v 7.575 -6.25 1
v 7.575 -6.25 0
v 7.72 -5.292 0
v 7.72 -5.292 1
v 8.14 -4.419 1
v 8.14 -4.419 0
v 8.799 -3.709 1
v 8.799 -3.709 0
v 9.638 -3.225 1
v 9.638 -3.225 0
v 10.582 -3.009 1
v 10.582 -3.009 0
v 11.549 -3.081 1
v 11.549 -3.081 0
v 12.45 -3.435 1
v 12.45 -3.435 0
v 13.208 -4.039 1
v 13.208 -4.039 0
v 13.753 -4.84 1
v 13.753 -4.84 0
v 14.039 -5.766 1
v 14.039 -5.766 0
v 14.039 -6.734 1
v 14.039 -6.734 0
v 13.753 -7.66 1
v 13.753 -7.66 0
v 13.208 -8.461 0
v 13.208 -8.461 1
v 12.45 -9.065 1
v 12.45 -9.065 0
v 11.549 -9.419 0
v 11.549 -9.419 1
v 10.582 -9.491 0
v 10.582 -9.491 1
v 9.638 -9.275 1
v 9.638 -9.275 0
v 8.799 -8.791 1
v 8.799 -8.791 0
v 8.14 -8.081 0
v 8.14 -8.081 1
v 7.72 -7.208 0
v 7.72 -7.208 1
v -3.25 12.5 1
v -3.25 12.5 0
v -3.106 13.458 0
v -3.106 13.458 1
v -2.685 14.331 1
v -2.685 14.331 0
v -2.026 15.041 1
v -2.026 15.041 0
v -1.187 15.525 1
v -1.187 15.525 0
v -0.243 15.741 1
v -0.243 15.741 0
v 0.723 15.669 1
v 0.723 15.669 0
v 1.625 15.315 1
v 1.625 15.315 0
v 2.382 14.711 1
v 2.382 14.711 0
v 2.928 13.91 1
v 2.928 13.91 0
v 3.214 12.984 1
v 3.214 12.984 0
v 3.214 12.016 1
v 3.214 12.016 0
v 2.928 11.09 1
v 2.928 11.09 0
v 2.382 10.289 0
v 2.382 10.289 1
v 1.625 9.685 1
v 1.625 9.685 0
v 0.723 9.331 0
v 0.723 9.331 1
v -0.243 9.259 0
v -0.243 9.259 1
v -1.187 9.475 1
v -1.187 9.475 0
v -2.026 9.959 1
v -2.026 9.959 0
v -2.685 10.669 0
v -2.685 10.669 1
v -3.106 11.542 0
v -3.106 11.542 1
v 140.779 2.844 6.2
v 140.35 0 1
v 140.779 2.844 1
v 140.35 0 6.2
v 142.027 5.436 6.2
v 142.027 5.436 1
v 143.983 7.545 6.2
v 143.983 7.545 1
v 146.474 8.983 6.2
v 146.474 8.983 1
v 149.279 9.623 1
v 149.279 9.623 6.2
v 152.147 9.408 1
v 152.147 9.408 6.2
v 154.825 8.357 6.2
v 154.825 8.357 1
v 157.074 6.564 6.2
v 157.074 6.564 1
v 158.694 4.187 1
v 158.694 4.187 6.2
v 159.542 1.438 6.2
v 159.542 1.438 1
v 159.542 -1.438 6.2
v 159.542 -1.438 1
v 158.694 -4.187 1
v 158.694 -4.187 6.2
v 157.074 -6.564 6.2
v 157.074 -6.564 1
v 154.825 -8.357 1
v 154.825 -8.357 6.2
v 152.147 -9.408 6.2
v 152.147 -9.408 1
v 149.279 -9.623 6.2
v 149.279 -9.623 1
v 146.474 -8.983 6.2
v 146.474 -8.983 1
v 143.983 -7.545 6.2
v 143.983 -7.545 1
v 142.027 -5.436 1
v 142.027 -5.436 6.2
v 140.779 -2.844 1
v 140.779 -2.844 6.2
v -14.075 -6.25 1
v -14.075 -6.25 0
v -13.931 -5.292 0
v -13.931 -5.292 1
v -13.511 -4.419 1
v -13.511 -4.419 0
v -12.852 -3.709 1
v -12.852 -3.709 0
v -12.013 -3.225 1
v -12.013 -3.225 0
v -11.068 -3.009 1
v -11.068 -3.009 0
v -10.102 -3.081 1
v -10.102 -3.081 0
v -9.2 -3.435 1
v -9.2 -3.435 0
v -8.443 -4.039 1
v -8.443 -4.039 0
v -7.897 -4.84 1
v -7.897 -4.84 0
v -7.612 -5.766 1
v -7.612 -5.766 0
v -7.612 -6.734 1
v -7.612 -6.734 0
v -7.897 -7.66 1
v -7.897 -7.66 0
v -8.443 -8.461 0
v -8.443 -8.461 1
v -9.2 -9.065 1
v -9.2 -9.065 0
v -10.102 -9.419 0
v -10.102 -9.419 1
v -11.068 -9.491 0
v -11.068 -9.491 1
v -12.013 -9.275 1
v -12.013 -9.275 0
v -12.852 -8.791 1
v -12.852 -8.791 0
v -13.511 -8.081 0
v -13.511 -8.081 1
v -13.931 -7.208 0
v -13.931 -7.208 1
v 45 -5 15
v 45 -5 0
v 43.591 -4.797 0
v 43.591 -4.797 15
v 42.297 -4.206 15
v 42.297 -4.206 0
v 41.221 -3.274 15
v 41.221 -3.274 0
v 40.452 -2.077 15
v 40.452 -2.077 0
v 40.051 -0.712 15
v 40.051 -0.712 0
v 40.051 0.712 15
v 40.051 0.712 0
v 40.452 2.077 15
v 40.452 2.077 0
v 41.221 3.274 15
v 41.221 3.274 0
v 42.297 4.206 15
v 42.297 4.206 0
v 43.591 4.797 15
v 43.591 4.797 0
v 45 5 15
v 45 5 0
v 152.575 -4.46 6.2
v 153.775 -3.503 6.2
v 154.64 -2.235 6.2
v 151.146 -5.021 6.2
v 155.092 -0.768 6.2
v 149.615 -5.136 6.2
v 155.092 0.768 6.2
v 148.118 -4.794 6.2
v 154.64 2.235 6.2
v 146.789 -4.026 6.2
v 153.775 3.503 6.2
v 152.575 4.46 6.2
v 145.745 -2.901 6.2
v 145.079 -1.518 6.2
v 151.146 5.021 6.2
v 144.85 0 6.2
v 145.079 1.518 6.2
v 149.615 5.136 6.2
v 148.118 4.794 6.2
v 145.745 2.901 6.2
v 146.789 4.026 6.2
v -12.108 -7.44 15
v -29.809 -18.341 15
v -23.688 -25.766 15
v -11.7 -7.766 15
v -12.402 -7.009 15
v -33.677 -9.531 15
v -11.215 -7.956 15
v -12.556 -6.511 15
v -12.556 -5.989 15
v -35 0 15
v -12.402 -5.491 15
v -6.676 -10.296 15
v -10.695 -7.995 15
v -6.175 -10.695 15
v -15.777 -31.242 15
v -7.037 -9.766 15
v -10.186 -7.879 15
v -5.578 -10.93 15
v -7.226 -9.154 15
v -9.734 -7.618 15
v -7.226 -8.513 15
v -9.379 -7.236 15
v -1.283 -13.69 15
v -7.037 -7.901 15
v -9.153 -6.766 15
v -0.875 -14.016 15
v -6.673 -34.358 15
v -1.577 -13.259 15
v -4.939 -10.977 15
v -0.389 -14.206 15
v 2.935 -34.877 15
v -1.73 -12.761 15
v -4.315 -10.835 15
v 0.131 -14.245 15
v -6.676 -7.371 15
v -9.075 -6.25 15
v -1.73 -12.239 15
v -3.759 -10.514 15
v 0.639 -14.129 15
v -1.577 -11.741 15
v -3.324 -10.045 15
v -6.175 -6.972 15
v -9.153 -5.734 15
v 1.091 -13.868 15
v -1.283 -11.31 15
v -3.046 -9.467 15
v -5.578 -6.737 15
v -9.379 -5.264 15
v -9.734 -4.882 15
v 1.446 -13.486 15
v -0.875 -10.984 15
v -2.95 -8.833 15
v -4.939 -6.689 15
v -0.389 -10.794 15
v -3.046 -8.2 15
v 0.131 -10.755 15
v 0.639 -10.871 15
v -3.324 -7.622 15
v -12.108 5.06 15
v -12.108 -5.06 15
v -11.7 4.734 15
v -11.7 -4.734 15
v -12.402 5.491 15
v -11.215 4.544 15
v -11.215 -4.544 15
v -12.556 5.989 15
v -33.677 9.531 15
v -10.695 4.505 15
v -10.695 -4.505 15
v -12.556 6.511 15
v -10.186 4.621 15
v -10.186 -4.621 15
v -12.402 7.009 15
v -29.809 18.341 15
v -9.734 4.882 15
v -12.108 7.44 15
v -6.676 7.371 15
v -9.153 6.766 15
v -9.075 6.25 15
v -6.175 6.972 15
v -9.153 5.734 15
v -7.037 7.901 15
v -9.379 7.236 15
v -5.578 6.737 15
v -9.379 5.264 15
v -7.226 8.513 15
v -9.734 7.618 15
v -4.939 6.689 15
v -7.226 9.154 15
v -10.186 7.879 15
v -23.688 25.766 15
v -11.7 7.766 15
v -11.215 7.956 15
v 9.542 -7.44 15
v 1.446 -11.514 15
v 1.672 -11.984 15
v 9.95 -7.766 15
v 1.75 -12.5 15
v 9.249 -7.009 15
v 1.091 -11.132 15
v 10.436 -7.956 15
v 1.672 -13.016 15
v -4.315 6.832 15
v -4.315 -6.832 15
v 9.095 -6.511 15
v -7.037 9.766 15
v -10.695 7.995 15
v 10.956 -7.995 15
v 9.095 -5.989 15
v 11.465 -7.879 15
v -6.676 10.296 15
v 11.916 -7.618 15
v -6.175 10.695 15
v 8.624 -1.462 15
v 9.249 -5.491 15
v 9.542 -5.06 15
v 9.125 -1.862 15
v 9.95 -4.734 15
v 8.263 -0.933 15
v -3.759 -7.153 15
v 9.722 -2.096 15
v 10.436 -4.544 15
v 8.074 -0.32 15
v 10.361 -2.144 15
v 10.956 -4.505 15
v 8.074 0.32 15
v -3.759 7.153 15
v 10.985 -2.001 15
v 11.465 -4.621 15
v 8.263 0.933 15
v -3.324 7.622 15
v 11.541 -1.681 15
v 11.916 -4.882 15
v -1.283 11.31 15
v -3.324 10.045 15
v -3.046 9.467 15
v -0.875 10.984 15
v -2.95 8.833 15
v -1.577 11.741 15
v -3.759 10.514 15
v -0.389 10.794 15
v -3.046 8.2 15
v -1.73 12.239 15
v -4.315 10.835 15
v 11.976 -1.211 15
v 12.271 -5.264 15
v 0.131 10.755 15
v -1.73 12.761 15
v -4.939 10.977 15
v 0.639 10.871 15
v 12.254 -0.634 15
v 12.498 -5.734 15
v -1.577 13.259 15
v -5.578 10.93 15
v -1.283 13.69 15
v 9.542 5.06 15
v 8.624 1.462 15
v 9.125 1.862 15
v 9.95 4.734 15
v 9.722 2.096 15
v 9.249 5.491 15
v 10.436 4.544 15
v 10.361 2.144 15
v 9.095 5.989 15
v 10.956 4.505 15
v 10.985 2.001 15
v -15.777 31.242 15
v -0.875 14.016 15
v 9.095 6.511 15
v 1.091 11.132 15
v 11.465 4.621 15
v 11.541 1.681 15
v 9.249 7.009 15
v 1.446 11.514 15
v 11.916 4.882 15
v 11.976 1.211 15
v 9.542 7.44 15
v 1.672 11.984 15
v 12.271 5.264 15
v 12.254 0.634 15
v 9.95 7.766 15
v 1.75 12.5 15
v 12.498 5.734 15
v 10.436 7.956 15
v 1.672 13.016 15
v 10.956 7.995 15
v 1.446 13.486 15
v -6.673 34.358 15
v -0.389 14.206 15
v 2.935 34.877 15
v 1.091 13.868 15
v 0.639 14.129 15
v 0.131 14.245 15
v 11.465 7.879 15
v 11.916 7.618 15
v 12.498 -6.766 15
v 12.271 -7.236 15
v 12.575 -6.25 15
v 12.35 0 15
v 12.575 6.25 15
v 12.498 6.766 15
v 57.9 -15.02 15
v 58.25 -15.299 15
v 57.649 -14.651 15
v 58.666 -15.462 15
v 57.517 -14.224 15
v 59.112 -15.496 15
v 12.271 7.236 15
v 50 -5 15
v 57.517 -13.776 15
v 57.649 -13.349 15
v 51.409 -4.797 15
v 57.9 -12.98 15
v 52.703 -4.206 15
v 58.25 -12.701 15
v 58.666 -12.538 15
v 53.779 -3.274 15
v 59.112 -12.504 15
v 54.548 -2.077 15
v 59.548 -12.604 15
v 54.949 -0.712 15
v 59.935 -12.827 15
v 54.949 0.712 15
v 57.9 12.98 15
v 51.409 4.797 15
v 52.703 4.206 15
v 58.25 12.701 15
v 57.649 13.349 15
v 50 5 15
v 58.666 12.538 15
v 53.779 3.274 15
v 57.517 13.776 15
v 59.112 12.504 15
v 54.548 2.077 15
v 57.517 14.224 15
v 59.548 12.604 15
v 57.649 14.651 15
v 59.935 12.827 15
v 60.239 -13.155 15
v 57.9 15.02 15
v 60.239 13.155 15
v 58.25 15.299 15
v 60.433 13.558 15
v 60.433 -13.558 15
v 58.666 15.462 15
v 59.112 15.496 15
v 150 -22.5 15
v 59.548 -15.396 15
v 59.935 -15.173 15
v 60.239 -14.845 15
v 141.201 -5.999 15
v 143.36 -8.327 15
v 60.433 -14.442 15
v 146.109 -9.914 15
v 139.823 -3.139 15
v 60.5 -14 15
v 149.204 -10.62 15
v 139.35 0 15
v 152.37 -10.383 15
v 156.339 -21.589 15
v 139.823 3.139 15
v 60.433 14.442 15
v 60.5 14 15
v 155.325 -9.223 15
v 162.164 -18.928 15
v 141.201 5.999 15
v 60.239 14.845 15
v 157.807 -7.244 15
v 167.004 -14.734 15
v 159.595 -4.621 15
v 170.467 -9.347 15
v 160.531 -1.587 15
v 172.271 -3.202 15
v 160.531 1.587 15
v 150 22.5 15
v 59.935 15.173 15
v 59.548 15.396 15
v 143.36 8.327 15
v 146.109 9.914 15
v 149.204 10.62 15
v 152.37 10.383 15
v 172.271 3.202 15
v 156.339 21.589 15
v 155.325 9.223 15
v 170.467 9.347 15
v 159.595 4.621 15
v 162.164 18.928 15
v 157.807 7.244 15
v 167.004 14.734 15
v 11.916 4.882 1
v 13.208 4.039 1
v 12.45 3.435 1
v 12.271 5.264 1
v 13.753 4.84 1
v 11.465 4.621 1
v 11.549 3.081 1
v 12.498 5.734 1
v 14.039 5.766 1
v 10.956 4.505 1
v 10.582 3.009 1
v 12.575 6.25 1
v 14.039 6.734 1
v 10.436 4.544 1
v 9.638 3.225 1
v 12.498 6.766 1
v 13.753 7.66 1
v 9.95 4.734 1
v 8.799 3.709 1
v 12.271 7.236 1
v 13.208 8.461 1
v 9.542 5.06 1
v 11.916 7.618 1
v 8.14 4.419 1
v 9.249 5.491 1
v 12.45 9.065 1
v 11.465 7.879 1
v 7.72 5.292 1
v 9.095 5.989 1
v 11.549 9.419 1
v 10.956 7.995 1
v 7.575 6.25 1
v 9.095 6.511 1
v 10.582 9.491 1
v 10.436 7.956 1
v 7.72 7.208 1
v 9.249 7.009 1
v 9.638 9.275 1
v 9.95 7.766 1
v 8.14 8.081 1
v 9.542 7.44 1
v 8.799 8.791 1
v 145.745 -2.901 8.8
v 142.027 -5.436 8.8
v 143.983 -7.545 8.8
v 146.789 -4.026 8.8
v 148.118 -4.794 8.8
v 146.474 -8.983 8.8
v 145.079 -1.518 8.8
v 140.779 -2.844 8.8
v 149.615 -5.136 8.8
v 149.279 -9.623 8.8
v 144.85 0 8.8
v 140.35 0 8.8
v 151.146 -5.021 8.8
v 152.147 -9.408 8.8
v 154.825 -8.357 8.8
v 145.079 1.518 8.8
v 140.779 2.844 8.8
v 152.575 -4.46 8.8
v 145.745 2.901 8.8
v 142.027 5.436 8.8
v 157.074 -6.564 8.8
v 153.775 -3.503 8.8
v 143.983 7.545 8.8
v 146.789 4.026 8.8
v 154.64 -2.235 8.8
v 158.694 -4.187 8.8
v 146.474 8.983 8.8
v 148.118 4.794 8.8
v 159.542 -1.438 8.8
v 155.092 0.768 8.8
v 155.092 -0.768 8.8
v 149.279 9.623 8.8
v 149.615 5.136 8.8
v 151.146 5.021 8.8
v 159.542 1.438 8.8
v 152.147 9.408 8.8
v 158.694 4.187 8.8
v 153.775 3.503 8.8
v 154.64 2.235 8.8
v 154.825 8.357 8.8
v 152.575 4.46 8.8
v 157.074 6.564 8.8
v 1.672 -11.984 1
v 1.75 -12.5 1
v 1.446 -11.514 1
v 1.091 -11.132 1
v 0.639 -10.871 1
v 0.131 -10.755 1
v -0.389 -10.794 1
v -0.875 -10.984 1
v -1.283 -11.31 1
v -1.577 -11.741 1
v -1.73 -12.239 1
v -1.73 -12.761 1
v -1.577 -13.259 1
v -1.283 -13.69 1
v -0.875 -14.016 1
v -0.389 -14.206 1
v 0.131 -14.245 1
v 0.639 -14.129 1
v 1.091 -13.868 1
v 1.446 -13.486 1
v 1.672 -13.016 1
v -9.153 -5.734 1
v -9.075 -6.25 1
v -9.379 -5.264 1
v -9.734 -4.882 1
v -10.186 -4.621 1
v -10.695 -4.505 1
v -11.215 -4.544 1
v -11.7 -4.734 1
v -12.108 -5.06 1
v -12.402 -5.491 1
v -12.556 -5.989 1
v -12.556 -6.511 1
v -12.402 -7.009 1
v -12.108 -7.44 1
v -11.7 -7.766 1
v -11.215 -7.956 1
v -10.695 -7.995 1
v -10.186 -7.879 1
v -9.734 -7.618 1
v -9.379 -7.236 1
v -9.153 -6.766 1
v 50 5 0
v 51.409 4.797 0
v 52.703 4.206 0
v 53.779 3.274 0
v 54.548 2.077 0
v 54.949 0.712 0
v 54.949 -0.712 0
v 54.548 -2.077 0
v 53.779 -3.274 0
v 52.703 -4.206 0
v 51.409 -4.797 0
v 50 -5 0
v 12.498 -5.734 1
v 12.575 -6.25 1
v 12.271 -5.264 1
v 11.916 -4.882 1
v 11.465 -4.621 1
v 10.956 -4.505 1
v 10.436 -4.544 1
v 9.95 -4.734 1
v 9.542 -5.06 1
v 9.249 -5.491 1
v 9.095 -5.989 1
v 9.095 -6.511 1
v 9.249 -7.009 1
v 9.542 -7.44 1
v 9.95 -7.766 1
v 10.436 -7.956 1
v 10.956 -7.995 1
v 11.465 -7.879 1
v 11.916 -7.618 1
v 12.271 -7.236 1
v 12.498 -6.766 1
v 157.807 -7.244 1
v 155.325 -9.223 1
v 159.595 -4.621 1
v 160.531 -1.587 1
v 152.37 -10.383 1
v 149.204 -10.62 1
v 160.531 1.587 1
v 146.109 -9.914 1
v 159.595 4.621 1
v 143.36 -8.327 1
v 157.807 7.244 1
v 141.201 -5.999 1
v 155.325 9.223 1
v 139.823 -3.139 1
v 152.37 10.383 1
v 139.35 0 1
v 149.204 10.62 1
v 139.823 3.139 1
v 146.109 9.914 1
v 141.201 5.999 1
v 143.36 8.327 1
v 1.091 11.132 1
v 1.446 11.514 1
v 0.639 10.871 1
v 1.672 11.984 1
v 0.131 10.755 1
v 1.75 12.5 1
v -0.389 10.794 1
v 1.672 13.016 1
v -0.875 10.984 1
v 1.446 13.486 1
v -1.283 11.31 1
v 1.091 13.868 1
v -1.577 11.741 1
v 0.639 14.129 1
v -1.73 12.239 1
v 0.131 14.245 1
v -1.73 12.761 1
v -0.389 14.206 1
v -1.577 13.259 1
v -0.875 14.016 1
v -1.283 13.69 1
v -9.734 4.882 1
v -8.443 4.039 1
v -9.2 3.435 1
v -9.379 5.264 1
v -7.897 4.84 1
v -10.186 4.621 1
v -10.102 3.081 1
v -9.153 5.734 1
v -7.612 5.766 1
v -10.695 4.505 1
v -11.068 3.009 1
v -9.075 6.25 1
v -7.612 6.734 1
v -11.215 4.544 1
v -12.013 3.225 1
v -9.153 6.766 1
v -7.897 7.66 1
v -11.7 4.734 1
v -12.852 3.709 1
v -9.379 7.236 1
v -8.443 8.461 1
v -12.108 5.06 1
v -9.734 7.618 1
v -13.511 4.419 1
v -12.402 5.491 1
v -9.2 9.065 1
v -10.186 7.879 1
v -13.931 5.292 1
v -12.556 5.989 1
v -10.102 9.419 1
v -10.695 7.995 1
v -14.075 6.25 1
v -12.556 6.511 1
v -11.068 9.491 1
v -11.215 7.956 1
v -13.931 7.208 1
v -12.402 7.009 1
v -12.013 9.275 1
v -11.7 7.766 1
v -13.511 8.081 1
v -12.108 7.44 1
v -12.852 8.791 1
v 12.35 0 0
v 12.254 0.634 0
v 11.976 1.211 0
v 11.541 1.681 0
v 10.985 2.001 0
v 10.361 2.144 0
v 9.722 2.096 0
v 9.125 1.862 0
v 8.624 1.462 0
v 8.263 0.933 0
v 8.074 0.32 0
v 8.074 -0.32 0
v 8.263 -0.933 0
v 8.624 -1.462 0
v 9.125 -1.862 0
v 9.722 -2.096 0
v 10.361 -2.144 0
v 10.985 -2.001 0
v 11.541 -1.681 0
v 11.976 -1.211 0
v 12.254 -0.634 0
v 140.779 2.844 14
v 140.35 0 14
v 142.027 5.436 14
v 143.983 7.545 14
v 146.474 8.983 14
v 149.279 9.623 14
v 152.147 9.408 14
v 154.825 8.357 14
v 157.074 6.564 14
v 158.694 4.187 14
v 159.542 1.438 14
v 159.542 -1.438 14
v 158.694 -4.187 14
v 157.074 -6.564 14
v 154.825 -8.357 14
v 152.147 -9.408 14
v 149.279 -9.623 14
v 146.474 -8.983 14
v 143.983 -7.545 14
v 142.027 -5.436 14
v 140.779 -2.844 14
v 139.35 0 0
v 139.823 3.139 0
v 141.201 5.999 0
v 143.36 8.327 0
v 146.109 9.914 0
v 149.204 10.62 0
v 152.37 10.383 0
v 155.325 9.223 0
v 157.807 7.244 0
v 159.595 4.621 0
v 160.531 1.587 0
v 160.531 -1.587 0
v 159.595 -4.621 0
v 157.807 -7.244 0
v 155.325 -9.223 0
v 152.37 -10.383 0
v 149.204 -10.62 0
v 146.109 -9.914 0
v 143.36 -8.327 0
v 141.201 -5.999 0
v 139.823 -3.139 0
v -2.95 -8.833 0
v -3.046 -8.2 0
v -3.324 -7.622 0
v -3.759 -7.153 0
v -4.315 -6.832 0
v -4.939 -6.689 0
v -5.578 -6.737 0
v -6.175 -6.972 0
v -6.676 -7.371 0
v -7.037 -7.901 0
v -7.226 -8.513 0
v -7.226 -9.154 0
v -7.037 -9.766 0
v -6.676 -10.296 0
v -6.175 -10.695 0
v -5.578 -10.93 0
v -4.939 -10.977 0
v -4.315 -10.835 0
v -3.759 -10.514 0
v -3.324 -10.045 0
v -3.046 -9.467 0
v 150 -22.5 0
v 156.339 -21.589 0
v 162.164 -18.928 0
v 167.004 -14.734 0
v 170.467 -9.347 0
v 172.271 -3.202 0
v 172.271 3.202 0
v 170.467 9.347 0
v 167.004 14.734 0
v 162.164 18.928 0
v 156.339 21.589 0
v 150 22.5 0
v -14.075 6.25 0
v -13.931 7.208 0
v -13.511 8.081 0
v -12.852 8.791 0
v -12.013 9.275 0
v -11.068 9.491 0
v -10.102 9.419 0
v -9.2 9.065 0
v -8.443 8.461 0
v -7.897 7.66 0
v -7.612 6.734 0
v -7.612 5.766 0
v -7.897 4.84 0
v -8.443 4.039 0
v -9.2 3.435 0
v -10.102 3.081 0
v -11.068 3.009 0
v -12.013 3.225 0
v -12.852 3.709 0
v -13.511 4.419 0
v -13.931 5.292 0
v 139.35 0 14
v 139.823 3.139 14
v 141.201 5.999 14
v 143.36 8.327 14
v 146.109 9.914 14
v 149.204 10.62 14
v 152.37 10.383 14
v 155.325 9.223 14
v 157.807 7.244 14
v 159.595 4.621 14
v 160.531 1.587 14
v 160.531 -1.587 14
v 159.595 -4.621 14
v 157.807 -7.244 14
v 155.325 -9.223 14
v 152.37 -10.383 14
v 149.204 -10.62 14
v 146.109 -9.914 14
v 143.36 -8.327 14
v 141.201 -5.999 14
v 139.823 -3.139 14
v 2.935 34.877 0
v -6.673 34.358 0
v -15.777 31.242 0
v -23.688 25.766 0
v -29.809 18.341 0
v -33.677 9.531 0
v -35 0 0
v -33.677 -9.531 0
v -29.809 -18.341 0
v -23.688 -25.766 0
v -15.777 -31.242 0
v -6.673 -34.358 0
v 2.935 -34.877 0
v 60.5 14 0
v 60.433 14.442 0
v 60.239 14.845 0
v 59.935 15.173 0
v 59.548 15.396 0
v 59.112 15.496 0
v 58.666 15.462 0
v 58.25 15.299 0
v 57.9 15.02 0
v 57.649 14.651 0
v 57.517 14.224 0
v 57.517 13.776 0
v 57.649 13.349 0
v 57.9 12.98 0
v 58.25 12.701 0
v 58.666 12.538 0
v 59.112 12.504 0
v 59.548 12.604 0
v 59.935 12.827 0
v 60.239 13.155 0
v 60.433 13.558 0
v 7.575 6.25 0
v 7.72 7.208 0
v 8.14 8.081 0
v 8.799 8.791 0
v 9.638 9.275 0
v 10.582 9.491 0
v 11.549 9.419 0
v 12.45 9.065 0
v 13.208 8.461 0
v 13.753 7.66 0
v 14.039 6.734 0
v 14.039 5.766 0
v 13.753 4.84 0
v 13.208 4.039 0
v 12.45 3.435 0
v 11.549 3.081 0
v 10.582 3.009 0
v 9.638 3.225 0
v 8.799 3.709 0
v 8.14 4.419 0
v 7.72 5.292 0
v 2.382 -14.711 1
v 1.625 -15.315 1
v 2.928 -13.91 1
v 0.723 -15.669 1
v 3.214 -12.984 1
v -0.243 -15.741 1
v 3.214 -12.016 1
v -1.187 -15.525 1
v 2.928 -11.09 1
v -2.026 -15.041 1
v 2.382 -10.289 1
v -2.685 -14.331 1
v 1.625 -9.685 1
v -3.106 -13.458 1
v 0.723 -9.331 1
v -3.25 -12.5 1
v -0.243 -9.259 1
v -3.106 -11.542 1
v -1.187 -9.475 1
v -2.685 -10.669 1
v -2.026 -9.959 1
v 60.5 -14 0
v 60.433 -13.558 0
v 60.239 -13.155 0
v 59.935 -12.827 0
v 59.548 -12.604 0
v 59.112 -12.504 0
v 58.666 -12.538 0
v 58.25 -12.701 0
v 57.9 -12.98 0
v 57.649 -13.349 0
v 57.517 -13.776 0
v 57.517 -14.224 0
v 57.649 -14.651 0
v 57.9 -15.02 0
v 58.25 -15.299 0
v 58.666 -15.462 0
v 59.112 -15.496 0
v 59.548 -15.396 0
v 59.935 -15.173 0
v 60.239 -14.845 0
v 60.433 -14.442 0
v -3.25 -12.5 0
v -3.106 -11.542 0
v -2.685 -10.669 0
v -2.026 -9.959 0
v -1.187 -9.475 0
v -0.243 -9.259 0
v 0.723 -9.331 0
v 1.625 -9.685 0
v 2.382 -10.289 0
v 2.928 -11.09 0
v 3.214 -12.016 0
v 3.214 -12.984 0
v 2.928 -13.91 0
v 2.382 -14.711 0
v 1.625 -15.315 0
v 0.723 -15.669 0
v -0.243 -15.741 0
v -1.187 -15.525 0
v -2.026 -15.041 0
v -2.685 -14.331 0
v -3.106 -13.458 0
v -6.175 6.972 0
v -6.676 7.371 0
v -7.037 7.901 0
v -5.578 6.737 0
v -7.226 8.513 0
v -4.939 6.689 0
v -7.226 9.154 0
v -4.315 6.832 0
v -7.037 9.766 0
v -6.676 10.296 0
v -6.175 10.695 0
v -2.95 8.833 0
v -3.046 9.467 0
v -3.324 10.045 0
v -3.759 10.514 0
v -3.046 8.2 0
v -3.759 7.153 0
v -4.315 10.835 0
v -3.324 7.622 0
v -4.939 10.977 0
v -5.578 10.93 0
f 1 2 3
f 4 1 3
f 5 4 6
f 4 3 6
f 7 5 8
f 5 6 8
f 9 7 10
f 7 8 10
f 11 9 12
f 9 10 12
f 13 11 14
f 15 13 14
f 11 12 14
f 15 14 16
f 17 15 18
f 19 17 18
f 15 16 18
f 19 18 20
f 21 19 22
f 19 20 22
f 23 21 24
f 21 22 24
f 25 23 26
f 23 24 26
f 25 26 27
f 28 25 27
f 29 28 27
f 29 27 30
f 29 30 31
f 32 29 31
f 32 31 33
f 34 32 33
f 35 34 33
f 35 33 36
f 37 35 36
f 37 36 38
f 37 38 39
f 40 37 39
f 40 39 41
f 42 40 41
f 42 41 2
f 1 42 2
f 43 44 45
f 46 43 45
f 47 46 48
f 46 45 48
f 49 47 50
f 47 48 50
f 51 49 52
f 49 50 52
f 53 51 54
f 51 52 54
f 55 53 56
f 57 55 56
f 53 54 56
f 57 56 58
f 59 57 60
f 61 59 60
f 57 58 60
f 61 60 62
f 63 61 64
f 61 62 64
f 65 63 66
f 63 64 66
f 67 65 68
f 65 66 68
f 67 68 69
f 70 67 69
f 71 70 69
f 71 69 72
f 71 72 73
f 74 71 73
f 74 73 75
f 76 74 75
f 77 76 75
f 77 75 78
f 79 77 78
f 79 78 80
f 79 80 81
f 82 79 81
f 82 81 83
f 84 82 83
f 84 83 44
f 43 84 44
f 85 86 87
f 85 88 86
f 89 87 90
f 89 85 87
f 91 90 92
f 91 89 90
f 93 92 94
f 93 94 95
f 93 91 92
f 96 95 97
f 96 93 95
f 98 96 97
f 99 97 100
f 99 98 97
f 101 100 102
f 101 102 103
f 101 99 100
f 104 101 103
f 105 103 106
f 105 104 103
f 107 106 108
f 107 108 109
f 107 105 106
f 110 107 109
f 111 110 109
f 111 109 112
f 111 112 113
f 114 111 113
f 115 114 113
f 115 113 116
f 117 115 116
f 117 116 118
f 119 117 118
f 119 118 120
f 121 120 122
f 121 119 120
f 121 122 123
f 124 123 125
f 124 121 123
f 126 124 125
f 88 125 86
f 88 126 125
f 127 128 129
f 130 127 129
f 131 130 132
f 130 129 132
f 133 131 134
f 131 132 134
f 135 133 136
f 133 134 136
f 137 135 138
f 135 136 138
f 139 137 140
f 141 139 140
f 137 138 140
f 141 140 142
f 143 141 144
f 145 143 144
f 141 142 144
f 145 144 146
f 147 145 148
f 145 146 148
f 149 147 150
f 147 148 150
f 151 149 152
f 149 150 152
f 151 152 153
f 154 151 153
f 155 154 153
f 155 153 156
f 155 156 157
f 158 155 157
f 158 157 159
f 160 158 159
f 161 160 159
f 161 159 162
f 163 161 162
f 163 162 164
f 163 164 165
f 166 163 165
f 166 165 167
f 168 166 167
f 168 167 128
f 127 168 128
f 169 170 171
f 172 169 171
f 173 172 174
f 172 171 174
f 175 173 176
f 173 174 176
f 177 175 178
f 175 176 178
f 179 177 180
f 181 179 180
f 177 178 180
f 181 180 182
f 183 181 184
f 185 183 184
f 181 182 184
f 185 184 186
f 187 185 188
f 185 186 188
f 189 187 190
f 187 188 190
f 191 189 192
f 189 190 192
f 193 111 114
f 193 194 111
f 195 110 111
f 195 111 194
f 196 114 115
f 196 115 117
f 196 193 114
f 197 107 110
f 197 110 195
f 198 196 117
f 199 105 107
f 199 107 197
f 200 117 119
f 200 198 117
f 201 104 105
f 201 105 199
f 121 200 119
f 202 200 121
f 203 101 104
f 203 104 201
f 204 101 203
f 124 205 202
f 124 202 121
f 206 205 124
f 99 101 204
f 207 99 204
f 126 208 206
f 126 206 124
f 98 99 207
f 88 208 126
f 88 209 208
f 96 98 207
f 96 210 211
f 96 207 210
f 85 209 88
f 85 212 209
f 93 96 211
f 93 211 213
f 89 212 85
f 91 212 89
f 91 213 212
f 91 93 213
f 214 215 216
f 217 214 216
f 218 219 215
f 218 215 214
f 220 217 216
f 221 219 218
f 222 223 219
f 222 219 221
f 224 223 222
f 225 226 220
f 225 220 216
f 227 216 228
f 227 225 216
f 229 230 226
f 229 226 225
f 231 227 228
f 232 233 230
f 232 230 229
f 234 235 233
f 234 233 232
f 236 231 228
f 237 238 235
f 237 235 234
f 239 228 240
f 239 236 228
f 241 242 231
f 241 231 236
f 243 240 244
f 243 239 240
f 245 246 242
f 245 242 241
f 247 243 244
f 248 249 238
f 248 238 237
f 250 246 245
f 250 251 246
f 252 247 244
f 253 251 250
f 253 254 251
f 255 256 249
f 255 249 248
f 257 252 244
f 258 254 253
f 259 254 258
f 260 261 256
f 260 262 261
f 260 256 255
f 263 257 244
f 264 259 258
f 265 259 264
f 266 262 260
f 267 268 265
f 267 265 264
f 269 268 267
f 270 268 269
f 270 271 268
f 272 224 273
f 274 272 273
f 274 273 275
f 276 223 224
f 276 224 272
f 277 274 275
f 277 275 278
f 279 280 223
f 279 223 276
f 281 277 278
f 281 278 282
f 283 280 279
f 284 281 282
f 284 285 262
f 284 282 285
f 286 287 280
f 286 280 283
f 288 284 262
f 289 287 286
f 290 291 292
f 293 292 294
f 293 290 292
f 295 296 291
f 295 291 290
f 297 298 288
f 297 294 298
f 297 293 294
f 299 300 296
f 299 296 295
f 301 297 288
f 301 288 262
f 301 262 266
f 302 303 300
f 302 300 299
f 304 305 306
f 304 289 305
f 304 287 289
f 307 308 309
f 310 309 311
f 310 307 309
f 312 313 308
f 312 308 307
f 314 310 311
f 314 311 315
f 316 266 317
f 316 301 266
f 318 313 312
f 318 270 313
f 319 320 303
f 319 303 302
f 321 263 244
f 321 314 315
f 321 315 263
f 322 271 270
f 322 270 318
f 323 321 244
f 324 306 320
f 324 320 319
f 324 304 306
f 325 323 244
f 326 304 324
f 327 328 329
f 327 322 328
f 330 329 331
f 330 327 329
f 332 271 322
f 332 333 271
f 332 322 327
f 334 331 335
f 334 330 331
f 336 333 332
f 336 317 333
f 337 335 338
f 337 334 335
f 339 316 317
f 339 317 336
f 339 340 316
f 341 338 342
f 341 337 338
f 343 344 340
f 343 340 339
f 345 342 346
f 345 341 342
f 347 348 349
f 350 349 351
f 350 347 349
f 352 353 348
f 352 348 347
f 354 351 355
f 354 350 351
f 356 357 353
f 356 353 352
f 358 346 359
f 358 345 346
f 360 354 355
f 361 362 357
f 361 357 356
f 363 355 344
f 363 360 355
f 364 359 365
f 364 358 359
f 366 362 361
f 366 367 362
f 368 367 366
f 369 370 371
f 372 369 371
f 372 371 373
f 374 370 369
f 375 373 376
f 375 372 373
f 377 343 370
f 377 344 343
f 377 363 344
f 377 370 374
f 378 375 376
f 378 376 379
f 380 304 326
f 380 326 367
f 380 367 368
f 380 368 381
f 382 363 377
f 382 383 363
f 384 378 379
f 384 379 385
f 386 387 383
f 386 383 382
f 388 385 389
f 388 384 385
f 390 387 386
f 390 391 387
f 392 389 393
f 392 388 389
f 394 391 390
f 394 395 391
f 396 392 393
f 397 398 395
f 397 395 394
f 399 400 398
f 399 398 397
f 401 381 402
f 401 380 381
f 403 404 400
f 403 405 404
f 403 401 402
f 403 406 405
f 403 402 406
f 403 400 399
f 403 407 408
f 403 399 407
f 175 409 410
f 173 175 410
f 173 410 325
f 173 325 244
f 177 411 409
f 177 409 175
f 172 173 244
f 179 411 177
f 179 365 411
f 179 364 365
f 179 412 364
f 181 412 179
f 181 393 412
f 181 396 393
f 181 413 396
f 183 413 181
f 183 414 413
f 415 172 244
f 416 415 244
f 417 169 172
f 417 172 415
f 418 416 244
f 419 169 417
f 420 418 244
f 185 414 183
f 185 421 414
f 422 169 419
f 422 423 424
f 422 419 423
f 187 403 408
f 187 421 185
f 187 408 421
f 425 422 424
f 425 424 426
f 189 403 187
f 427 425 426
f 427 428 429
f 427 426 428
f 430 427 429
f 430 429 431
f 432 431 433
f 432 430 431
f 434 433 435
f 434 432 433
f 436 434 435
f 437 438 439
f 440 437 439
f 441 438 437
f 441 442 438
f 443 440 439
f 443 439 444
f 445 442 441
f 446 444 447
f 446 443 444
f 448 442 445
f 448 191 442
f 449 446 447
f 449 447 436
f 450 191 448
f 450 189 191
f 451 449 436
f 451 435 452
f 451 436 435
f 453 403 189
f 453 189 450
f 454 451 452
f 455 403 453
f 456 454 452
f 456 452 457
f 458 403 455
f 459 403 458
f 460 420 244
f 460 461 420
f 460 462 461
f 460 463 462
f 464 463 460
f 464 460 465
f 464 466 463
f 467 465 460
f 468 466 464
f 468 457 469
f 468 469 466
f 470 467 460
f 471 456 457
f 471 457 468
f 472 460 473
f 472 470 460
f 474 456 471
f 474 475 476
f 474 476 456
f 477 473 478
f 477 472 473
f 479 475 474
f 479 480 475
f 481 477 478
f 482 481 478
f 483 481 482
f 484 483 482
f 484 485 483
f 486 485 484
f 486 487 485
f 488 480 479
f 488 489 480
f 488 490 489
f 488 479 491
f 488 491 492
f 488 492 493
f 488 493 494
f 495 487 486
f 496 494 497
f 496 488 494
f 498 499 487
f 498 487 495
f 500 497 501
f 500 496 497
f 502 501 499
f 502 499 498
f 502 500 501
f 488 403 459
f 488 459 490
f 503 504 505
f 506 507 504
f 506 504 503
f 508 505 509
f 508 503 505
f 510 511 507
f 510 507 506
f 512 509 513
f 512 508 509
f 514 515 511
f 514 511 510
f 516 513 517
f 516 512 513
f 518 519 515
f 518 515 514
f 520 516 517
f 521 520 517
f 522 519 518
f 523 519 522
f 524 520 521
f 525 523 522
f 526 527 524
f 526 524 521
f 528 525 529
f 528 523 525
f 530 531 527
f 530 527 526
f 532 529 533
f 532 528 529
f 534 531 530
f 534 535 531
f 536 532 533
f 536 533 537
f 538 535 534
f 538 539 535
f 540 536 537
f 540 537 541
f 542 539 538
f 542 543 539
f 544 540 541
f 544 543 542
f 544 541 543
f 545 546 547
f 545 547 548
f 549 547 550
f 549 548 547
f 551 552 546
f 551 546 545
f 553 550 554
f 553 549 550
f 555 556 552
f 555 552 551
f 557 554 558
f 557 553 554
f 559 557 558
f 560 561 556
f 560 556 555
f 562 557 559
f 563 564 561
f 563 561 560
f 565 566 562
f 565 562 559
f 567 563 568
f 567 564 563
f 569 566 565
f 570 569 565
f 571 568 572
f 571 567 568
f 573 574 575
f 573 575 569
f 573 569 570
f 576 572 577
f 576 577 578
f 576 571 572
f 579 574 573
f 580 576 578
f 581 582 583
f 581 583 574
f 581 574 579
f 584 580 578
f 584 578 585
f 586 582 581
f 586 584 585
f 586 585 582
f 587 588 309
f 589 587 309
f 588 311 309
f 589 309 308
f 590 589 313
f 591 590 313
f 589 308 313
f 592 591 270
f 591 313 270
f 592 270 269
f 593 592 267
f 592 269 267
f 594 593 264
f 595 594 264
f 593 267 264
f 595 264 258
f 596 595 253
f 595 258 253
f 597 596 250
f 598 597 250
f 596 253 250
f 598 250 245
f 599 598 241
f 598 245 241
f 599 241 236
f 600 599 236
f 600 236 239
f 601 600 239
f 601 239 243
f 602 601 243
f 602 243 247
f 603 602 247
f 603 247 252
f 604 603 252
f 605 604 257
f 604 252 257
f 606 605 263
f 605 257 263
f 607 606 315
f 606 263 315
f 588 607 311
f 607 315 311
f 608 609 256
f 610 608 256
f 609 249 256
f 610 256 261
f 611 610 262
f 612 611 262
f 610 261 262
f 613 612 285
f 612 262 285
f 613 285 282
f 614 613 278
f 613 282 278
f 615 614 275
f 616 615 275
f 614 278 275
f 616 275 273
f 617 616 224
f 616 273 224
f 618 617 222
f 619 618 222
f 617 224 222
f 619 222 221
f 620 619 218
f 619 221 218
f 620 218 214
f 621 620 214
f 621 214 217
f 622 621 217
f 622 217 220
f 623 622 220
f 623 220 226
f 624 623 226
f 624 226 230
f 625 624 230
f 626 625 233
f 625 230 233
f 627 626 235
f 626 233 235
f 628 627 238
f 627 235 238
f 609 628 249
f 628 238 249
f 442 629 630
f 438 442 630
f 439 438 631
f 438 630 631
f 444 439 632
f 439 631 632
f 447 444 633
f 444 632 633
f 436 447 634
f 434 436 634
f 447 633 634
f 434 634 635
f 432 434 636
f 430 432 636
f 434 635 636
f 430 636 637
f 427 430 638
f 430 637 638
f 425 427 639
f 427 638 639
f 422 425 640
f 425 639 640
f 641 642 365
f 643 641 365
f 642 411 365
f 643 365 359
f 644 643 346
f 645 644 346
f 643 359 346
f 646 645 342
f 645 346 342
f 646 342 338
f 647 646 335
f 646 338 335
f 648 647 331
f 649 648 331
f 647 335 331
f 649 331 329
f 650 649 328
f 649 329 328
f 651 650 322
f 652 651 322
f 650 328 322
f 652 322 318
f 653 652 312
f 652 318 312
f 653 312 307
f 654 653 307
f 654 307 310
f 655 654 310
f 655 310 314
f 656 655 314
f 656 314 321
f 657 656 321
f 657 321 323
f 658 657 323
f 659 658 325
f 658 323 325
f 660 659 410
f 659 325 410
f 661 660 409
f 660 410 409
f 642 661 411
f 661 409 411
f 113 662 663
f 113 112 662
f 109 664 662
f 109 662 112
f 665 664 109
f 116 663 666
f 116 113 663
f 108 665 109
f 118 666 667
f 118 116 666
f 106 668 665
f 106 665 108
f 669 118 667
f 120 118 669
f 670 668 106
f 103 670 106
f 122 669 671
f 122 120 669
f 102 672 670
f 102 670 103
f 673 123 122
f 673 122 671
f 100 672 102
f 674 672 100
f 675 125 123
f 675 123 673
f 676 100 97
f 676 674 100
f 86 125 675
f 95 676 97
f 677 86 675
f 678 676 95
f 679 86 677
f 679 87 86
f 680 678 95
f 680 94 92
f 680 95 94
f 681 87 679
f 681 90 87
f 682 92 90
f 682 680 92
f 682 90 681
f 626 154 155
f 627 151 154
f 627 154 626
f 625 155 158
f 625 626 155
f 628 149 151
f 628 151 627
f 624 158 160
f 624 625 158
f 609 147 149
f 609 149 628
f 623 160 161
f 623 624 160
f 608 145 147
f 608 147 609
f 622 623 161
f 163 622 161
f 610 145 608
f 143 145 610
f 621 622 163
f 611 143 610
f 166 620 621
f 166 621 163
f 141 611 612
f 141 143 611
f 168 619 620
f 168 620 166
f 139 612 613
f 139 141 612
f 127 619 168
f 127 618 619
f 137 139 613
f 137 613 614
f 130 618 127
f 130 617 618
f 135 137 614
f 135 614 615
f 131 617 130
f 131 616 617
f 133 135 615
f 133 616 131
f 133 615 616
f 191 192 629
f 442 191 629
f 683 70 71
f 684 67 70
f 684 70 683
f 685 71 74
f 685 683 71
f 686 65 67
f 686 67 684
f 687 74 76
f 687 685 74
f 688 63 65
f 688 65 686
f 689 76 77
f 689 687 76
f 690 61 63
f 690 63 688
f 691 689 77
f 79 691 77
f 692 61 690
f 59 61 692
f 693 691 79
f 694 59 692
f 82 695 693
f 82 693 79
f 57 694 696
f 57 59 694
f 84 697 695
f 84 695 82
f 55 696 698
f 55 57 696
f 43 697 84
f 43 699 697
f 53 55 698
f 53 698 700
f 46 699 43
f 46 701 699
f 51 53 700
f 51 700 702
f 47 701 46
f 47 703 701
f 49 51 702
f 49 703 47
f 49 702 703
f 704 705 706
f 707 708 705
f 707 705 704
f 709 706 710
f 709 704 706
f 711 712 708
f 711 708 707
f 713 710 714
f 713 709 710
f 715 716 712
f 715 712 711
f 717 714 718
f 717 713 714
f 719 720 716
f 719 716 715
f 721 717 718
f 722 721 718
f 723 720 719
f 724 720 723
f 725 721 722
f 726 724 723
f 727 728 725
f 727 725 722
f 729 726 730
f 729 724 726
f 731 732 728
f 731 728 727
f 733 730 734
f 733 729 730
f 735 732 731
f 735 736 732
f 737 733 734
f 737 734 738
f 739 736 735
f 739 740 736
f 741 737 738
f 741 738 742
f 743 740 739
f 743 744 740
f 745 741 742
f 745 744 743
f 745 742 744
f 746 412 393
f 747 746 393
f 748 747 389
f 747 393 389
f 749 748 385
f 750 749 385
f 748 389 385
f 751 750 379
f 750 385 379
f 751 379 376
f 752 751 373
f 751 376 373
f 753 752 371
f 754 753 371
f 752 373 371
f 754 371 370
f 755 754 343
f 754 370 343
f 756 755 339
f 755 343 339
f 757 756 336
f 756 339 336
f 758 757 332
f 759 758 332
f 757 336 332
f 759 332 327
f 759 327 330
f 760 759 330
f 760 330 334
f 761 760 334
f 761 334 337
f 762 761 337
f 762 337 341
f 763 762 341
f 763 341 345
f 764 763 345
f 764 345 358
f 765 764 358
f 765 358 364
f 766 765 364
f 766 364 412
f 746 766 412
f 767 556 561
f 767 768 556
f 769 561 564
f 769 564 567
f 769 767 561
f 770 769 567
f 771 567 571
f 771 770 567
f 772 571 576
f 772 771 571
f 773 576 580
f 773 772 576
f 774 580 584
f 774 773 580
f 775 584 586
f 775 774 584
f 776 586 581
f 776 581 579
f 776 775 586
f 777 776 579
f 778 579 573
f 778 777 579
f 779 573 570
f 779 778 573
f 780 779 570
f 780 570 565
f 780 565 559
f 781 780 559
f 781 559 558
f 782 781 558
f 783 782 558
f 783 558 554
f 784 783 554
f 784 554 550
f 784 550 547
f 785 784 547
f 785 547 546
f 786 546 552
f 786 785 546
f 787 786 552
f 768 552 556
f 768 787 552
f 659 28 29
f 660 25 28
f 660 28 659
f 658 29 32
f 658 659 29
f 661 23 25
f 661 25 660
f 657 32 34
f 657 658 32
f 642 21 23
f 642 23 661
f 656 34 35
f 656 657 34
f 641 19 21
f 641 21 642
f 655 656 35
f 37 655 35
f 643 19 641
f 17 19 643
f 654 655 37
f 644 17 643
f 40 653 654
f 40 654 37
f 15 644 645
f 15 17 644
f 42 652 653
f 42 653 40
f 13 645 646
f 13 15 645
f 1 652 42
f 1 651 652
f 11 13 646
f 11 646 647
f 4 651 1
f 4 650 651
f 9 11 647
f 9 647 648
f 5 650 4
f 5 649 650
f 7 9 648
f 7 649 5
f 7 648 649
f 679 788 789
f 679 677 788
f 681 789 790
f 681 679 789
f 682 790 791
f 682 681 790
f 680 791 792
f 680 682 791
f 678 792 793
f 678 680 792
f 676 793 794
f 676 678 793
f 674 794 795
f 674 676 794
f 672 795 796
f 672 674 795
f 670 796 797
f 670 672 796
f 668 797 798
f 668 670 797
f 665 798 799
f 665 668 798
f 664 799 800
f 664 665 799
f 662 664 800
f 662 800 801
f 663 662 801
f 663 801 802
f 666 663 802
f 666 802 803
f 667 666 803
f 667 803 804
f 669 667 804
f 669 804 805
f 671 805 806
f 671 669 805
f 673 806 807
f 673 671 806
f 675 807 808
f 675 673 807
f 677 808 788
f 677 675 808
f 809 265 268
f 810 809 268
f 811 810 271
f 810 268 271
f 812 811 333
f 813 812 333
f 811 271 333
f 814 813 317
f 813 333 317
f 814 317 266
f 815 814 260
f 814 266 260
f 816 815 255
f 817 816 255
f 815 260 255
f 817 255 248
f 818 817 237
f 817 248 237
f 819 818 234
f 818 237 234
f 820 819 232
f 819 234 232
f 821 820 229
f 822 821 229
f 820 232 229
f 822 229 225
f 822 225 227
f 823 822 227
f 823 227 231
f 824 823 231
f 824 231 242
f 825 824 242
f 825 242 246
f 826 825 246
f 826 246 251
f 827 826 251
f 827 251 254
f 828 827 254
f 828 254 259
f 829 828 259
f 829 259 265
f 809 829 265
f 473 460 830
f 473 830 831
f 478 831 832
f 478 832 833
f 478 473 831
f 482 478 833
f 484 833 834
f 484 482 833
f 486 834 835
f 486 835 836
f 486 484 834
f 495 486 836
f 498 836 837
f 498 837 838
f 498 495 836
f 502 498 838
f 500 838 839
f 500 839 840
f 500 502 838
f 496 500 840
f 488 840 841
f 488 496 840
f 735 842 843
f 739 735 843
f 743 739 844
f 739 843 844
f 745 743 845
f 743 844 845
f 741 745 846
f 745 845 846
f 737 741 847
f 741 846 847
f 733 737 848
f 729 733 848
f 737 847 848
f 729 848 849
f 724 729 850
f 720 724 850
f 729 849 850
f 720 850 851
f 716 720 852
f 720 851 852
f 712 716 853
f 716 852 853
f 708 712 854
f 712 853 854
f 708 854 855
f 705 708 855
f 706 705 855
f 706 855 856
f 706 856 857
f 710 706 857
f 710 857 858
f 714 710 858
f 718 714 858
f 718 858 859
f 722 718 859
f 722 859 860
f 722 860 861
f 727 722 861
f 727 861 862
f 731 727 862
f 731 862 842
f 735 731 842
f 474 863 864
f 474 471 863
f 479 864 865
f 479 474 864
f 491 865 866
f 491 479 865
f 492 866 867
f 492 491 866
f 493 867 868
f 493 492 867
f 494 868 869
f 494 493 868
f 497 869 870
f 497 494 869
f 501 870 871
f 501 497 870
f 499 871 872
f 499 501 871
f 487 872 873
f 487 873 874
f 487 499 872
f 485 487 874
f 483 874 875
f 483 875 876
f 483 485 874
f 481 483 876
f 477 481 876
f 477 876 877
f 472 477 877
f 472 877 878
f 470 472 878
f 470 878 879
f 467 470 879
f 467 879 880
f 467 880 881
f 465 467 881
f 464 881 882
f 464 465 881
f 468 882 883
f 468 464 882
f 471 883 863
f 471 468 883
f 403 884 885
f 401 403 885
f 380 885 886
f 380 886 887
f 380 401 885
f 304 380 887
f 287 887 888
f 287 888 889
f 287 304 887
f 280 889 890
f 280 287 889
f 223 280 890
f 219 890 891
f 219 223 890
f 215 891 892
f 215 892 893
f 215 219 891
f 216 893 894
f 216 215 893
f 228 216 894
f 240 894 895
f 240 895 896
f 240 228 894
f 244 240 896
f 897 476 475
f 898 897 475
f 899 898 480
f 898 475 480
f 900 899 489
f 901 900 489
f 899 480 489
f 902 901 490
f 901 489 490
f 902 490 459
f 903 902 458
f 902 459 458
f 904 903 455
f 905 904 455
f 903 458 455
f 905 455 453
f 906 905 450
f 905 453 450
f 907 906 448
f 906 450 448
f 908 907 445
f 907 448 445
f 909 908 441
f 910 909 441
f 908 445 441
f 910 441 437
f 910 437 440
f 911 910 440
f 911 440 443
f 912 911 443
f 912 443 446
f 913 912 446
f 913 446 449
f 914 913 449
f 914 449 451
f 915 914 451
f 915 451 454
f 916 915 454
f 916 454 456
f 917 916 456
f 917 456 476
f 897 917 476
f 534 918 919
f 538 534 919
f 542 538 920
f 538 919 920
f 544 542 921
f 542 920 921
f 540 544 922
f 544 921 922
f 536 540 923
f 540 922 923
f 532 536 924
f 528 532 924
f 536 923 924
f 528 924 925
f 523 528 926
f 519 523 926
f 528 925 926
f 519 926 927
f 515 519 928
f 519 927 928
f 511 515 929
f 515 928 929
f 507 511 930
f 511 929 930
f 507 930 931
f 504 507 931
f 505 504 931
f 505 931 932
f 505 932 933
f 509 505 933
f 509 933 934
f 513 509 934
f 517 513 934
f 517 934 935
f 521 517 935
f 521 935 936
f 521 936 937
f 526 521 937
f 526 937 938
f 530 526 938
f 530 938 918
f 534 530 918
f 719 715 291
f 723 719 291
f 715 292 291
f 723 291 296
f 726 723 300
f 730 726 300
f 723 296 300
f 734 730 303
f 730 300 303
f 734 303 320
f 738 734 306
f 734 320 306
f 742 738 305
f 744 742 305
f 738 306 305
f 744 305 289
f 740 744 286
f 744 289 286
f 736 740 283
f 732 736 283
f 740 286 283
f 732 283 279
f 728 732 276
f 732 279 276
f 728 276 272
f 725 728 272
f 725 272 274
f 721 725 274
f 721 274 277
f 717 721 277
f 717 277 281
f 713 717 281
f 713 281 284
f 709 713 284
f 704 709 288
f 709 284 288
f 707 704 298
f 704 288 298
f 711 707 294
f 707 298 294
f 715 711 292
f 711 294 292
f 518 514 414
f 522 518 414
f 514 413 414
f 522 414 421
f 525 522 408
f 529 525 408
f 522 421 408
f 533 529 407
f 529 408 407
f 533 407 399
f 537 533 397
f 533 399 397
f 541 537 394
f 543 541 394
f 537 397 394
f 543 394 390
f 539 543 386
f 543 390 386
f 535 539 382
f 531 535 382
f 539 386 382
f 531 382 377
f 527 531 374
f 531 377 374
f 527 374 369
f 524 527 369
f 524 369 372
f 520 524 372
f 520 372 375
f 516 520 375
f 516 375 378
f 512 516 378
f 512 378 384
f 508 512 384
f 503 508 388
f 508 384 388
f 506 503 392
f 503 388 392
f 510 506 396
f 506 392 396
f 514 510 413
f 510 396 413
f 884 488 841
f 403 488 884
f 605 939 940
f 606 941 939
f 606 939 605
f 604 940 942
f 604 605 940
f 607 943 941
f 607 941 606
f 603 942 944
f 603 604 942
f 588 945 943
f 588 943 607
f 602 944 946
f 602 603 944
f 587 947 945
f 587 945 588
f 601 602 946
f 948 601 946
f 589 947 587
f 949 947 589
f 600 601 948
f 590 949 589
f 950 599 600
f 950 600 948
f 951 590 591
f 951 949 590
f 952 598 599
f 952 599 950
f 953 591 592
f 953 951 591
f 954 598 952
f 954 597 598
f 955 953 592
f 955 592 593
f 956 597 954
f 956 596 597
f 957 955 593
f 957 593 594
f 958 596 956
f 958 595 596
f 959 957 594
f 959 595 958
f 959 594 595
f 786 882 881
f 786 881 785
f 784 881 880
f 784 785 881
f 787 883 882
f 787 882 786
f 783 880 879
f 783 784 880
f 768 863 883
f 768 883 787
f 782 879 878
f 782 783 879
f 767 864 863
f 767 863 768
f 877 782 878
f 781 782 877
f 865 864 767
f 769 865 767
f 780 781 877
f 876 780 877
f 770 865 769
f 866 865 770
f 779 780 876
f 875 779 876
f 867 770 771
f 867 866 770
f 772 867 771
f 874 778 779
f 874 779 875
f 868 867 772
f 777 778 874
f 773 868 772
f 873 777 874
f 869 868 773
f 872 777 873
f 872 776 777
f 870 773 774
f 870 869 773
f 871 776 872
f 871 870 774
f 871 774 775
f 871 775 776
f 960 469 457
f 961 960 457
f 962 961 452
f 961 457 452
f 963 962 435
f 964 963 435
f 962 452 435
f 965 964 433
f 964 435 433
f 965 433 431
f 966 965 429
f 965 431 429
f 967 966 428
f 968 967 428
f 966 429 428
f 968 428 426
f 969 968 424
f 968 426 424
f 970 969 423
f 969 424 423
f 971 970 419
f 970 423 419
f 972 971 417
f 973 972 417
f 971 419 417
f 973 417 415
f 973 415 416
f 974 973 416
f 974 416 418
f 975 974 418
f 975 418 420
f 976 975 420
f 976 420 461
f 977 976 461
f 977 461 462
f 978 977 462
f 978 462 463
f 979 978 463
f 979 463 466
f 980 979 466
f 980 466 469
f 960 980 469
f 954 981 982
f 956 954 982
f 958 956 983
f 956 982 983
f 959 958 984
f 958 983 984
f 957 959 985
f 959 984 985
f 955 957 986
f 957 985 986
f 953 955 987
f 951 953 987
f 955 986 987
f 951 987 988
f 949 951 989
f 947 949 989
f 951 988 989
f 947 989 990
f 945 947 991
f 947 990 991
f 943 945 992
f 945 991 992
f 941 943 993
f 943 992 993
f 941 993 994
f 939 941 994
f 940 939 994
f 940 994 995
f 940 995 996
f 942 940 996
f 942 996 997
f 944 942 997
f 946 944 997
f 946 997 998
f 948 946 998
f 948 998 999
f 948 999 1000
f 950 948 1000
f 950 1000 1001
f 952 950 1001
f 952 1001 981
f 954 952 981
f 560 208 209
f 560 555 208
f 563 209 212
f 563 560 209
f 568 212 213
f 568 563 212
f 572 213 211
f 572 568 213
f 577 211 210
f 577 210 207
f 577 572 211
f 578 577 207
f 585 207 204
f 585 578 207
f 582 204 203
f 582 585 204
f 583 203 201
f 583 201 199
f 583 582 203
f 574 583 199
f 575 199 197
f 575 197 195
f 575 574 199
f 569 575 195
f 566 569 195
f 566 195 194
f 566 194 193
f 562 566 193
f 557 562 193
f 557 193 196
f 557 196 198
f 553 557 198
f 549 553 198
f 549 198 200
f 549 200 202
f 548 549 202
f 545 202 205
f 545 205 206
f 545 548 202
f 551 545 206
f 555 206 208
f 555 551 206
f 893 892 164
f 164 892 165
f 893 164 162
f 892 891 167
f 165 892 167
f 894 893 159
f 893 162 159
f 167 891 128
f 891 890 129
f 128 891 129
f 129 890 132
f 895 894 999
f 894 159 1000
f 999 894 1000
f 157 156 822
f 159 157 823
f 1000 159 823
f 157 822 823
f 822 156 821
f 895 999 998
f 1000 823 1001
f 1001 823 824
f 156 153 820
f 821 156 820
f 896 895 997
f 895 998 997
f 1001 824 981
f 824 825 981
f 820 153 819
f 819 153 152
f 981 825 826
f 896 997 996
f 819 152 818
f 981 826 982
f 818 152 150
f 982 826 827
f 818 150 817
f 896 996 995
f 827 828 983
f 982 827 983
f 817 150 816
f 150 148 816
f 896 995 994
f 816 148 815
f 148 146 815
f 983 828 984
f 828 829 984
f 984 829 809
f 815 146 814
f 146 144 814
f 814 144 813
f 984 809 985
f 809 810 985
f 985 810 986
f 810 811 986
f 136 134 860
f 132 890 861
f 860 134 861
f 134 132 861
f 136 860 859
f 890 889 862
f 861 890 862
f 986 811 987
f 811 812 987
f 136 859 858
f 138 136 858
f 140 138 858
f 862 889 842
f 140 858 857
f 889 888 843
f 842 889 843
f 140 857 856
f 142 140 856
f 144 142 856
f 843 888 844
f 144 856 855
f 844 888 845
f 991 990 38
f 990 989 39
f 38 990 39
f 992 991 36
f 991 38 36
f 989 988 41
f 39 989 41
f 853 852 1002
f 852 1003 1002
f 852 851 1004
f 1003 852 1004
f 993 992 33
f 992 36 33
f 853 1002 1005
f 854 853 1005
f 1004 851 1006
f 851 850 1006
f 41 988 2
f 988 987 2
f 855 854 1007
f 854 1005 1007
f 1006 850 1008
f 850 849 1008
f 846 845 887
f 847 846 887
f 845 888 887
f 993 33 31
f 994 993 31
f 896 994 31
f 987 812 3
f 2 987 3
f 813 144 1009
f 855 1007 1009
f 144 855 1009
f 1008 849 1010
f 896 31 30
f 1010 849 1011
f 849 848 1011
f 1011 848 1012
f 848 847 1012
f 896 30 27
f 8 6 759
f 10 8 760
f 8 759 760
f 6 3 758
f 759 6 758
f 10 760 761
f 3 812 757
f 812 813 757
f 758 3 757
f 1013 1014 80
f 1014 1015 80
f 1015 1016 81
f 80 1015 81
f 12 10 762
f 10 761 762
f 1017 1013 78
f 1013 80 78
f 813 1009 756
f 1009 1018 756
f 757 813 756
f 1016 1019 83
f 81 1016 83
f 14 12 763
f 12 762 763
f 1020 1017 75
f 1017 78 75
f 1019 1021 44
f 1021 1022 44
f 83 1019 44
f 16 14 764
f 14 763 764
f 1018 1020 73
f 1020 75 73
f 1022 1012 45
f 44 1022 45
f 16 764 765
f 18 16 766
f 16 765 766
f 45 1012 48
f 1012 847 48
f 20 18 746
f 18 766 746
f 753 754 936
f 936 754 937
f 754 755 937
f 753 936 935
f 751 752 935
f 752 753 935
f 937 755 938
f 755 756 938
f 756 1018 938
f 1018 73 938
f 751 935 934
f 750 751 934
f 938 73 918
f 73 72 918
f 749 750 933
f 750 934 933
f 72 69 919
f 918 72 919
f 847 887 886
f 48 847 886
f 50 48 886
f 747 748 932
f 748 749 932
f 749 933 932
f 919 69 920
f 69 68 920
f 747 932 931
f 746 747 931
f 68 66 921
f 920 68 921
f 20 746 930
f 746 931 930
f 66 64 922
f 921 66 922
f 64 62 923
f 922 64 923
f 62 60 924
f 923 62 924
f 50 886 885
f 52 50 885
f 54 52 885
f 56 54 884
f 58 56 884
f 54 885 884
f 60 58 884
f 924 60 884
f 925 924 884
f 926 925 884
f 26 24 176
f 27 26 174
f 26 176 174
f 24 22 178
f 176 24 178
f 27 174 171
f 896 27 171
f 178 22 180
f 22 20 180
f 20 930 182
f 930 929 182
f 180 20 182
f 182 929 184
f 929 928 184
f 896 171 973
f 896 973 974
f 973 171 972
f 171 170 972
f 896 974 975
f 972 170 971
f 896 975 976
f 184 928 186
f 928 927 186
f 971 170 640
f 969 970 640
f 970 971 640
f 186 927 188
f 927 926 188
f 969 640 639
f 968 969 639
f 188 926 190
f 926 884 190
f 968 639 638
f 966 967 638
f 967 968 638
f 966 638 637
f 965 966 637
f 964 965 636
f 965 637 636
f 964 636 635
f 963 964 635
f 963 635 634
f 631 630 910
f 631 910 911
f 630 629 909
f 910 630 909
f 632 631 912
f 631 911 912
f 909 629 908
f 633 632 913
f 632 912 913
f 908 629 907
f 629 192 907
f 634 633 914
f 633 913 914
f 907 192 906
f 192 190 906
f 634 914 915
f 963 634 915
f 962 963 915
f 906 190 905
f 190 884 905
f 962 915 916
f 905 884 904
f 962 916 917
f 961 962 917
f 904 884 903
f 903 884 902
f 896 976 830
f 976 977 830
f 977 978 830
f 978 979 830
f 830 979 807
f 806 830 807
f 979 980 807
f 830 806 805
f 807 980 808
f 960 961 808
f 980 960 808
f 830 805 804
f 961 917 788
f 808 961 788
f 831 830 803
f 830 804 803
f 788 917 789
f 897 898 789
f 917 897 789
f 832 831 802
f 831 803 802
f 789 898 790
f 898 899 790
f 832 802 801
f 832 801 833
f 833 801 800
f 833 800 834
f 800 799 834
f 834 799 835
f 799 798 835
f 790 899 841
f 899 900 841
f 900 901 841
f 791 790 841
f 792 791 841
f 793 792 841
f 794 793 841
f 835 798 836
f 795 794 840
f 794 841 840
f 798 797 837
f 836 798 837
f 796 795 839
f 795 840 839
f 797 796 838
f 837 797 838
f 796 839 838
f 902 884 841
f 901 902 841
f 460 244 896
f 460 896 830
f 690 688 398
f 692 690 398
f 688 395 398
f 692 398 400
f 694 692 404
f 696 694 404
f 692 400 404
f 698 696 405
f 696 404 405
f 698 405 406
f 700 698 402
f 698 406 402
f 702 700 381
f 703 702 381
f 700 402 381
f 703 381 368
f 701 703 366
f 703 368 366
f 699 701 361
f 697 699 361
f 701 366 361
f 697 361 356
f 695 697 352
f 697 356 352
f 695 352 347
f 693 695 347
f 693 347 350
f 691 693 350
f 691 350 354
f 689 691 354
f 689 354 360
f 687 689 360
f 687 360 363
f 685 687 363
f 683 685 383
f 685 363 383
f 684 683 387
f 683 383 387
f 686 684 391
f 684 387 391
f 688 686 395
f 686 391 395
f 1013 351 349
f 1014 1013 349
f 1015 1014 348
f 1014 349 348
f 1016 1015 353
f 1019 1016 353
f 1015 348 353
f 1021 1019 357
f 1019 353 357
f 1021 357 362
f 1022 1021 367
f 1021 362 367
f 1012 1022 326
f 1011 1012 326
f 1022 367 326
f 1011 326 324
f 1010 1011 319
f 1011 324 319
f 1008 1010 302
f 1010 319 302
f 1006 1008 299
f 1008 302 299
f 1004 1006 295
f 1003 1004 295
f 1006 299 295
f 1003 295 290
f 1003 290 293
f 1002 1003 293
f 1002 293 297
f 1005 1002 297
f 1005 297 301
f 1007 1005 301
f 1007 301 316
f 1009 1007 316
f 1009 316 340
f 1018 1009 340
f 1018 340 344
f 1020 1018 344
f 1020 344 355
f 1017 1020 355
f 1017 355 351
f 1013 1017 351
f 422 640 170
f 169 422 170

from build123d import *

# Parameters (mm, degrees)
EXTRUDE_1_DEPTH           = 15
CUT_EXTRUDE_1_DEPTH       = 177.652908269
HOLE_WIZARD_1_D           = 4.3
HOLE_WIZARD_2_D           = 4.3
HOLE_WIZARD_3_D           = 4.3
HOLE_WIZARD_4_D           = 3.5
HOLE_WIZARD_4_CBORE_D     = 6.5
HOLE_WIZARD_4_CBORE_DEPTH = 1
HOLE_WIZARD_5_D           = 3.5
HOLE_WIZARD_5_CBORE_D     = 6.5
HOLE_WIZARD_5_CBORE_DEPTH = 1
HOLE_WIZARD_6_D           = 3.5
HOLE_WIZARD_6_CBORE_D     = 6.5
HOLE_WIZARD_6_CBORE_DEPTH = 1
HOLE_WIZARD_7_D           = 3.5
HOLE_WIZARD_7_CBORE_D     = 6.5
HOLE_WIZARD_7_CBORE_DEPTH = 1
HOLE_WIZARD_8_D           = 3.5
HOLE_WIZARD_8_CBORE_D     = 6.5
HOLE_WIZARD_8_CBORE_DEPTH = 1
HOLE_WIZARD_9_D           = 3.5
HOLE_WIZARD_9_CBORE_D     = 6.5
HOLE_WIZARD_9_CBORE_DEPTH = 1
HOLE_WIZARD_10_D          = 3
HOLE_WIZARD_11_D          = 3


with BuildPart() as part:
    # 草图2 → 凸台-拉伸1 (new body)
    with BuildSketch(Plane.XY.offset(15)):
        with BuildLine():
            Line((150, 22.5), (2.93516031, 34.876709047))
            ThreePointArc((2.93516031, 34.876709047), (-35, 0), (2.93516031, -34.876709047))
            Line((2.93516031, -34.876709047), (150, -22.5))
            ThreePointArc((150, -22.5), (172.5, 0), (150, 22.5))
        make_face()
    extrude(amount=-EXTRUDE_1_DEPTH)

    # 草图3 → 切除-拉伸1 (cut, through all)
    with BuildSketch(Plane(origin=(0, 0, 0), x_dir=(-1, 0, 0), z_dir=(0, 0, -1))):
        with BuildLine():
            Line((-45, 5), (-50, 5))
            ThreePointArc((-50, 5), (-55, 0), (-50, -5))
            Line((-50, -5), (-45, -5))
            ThreePointArc((-45, -5), (-40, 0), (-45, 5))
        make_face()
    extrude(amount=-CUT_EXTRUDE_1_DEPTH, mode=Mode.SUBTRACT)

    # 草图4 → 切除-旋转1 (revolve, cut)
    with BuildSketch(Plane.XZ, mode=Mode.PRIVATE) as cut_revolve_1_sk:
        Polygon((160.65, 15), (150, 15), (150, 0), (160.65, 0), (160.65, 1), (159.65, 1), (159.65, 6.2), (155.15, 6.2), (155.15, 8.8), (159.65, 8.8), (159.65, 14), (160.65, 14), align=None)
    revolve(cut_revolve_1_sk.sketch.rotate(Axis((150, 0, 15), (0, 0, -1)), 180), axis=Axis((150, 0, 15), (0, 0, -1)), mode=Mode.SUBTRACT)

    # 孔1 (through all)
    with Locations(Plane(origin=(0, 0, 0), x_dir=(-1, 0, 0), z_dir=(0, 0, -1))):
        with Locations((5.1, 8.833459119)):
            Hole(HOLE_WIZARD_1_D / 2)

    # 孔2 (through all)
    with Locations(Plane(origin=(0, 0, 0), x_dir=(-1, 0, 0), z_dir=(0, 0, -1))):
        with Locations((5.1, -8.833459119)):
            Hole(HOLE_WIZARD_2_D / 2)

    # 孔3 (through all)
    with Locations(Plane(origin=(0, 0, 0), x_dir=(-1, 0, 0), z_dir=(0, 0, -1))):
        with Locations((-10.2, 0)):
            Hole(HOLE_WIZARD_3_D / 2)

    # 孔4 (through all)
    with Locations(Plane(origin=(0, 0, 0), x_dir=(-1, 0, 0), z_dir=(0, 0, -1))):
        with Locations((10.825317547, 6.25)):
            CounterBoreHole(HOLE_WIZARD_4_D / 2, HOLE_WIZARD_4_CBORE_D / 2, HOLE_WIZARD_4_CBORE_DEPTH)

    # 孔5 (through all)
    with Locations(Plane(origin=(0, 0, 0), x_dir=(-1, 0, 0), z_dir=(0, 0, -1))):
        with Locations((0, 12.5)):
            CounterBoreHole(HOLE_WIZARD_5_D / 2, HOLE_WIZARD_5_CBORE_D / 2, HOLE_WIZARD_5_CBORE_DEPTH)

    # 孔6 (through all)
    with Locations(Plane(origin=(0, 0, 0), x_dir=(-1, 0, 0), z_dir=(0, 0, -1))):
        with Locations((-10.825317547, 6.25)):
            CounterBoreHole(HOLE_WIZARD_6_D / 2, HOLE_WIZARD_6_CBORE_D / 2, HOLE_WIZARD_6_CBORE_DEPTH)

    # 孔7 (through all)
    with Locations(Plane(origin=(0, 0, 0), x_dir=(-1, 0, 0), z_dir=(0, 0, -1))):
        with Locations((-10.825317547, -6.25)):
            CounterBoreHole(HOLE_WIZARD_7_D / 2, HOLE_WIZARD_7_CBORE_D / 2, HOLE_WIZARD_7_CBORE_DEPTH)

    # 孔8 (through all)
    with Locations(Plane(origin=(0, 0, 0), x_dir=(-1, 0, 0), z_dir=(0, 0, -1))):
        with Locations((0, -12.5)):
            CounterBoreHole(HOLE_WIZARD_8_D / 2, HOLE_WIZARD_8_CBORE_D / 2, HOLE_WIZARD_8_CBORE_DEPTH)

    # 孔9 (through all)
    with Locations(Plane(origin=(0, 0, 0), x_dir=(-1, 0, 0), z_dir=(0, 0, -1))):
        with Locations((10.825317547, -6.25)):
            CounterBoreHole(HOLE_WIZARD_9_D / 2, HOLE_WIZARD_9_CBORE_D / 2, HOLE_WIZARD_9_CBORE_DEPTH)

    # 孔10 (through all)
    with Locations(Plane(origin=(0, 0, 0), x_dir=(-1, 0, 0), z_dir=(0, 0, -1))):
        with Locations((-59, -14)):
            Hole(HOLE_WIZARD_10_D / 2)

    # 孔11 (through all)
    with Locations(Plane(origin=(0, 0, 0), x_dir=(-1, 0, 0), z_dir=(0, 0, -1))):
        with Locations((-59, 14)):
            Hole(HOLE_WIZARD_11_D / 2)


solid = part.part
